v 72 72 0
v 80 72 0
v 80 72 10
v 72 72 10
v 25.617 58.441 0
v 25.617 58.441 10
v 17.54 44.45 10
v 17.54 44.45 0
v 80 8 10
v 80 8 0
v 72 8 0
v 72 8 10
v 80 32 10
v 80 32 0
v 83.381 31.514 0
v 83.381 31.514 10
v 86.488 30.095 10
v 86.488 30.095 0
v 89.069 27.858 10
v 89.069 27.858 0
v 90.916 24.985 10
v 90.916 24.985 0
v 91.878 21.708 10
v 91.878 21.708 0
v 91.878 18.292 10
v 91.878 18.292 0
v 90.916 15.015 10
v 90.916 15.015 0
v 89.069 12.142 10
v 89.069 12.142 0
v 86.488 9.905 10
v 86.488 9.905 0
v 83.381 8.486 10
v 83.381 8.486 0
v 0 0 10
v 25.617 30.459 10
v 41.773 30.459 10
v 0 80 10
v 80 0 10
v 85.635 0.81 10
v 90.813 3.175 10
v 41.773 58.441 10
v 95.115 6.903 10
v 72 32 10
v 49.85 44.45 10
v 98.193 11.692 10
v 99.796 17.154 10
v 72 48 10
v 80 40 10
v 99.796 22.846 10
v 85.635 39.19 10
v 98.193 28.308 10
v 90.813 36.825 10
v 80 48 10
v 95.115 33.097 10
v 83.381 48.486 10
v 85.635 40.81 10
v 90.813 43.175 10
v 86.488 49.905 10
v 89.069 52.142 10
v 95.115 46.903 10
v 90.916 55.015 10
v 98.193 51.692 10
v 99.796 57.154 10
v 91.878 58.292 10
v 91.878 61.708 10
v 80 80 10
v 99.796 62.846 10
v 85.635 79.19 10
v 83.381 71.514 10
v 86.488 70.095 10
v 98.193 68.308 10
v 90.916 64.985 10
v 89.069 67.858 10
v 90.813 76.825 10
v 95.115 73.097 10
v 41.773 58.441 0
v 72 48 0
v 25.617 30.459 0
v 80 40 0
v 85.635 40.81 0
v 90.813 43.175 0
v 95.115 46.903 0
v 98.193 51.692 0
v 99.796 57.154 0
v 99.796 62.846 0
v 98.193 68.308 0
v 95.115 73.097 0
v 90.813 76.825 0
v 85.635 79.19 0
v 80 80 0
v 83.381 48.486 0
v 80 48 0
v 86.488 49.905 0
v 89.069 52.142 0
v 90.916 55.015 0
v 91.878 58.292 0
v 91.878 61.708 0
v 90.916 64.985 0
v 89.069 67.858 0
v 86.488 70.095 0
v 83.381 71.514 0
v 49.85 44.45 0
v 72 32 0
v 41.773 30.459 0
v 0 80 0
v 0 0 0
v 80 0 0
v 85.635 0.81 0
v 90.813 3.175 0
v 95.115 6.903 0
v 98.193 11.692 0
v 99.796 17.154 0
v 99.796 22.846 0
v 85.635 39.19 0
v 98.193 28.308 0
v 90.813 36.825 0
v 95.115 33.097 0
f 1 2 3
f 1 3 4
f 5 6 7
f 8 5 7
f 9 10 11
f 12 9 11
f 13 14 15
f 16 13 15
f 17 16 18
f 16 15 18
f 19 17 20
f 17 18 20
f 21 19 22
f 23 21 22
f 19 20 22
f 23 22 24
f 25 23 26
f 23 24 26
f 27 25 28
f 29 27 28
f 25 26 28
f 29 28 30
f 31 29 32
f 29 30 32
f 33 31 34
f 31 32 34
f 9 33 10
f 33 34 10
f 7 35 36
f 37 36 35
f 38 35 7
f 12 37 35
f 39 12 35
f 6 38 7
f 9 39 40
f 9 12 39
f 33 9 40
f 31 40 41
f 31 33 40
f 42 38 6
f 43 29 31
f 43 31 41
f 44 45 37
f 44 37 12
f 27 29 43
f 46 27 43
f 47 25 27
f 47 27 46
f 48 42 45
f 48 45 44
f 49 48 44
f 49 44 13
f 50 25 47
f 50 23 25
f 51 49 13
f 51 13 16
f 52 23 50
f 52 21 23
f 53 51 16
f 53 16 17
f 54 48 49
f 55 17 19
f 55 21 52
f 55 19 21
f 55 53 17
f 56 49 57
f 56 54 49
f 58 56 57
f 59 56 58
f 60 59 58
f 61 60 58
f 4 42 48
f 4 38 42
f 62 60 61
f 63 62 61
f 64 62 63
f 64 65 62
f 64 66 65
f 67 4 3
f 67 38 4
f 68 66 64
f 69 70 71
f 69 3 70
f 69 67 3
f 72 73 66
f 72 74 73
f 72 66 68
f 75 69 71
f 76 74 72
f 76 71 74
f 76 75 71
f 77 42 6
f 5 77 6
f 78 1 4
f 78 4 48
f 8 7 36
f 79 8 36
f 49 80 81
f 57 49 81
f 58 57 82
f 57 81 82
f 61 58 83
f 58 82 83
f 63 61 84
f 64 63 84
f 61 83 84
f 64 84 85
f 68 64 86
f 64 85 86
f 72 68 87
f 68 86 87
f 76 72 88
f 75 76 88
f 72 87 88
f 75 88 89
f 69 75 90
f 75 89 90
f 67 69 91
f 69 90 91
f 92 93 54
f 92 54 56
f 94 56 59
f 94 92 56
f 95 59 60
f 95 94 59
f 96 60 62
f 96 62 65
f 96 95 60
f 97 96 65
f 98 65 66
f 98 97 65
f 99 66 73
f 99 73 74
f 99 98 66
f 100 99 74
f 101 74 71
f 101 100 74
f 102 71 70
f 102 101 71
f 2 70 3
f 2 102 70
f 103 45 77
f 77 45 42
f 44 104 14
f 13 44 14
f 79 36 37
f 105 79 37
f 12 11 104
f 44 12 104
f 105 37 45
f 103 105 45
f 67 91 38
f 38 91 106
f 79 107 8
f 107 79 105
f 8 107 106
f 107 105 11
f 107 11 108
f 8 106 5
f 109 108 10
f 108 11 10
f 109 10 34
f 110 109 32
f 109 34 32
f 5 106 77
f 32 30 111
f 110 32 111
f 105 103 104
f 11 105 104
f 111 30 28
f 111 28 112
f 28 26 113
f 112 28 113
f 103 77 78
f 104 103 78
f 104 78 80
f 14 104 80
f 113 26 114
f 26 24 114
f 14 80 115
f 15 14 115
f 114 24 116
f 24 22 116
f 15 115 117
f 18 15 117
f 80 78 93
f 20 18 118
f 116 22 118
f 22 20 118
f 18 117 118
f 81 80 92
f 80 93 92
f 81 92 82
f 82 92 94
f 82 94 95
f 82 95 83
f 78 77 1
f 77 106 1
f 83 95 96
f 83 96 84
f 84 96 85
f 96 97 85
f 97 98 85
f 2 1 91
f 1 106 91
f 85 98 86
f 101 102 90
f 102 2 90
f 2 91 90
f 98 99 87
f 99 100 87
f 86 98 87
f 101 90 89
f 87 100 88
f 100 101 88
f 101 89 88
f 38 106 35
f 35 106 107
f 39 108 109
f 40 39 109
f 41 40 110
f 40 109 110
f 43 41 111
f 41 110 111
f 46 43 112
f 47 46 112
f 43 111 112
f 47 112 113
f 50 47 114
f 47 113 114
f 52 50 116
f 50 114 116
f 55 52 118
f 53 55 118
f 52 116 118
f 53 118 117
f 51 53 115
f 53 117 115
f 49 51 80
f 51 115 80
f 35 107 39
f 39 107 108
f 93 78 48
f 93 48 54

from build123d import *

# Parameters (mm, degrees)
BOSS_EXTRU_1_DEPTH      = 10
ENL_V_MAT_EXTRU_3_DEPTH = 129.452325787


with BuildPart() as part:
    # Esquisse1 → Boss.-Extru.1 (new body)
    with BuildSketch(Plane.XY):
        with BuildLine():
            Line((0, 0), (80, 0))
            ThreePointArc((80, 0), (100, 20), (80, 40))
            ThreePointArc((80, 40), (100, 60), (80, 80))
            Line((80, 80), (0, 80))
            Line((0, 80), (0, 0))
        make_face()
        with BuildLine():
            Line((72, 8), (72, 32))
            Line((72, 32), (80, 32))
            ThreePointArc((80, 32), (92, 20), (80, 8))
            Line((80, 8), (72, 8))
        make_face(mode=Mode.SUBTRACT)
        with BuildLine():
            Line((72, 48), (80, 48))
            ThreePointArc((80, 48), (92, 60), (80, 72))
            Line((80, 72), (72, 72))
            Line((72, 72), (72, 48))
        make_face(mode=Mode.SUBTRACT)
    extrude(amount=BOSS_EXTRU_1_DEPTH)

    # Esquisse2 → Enlèv. mat.-Extru.3 (cut, through all)
    with BuildSketch(Plane.XY.offset(10)):
        Polygon((49.85041269, 44.450222472), (41.772697951, 58.441234808), (25.617268474, 58.441234808), (17.539553736, 44.450222472), (25.617268474, 30.459210135), (41.772697951, 30.459210135), align=None)
    extrude(amount=-ENL_V_MAT_EXTRU_3_DEPTH, mode=Mode.SUBTRACT)


solid = part.part
